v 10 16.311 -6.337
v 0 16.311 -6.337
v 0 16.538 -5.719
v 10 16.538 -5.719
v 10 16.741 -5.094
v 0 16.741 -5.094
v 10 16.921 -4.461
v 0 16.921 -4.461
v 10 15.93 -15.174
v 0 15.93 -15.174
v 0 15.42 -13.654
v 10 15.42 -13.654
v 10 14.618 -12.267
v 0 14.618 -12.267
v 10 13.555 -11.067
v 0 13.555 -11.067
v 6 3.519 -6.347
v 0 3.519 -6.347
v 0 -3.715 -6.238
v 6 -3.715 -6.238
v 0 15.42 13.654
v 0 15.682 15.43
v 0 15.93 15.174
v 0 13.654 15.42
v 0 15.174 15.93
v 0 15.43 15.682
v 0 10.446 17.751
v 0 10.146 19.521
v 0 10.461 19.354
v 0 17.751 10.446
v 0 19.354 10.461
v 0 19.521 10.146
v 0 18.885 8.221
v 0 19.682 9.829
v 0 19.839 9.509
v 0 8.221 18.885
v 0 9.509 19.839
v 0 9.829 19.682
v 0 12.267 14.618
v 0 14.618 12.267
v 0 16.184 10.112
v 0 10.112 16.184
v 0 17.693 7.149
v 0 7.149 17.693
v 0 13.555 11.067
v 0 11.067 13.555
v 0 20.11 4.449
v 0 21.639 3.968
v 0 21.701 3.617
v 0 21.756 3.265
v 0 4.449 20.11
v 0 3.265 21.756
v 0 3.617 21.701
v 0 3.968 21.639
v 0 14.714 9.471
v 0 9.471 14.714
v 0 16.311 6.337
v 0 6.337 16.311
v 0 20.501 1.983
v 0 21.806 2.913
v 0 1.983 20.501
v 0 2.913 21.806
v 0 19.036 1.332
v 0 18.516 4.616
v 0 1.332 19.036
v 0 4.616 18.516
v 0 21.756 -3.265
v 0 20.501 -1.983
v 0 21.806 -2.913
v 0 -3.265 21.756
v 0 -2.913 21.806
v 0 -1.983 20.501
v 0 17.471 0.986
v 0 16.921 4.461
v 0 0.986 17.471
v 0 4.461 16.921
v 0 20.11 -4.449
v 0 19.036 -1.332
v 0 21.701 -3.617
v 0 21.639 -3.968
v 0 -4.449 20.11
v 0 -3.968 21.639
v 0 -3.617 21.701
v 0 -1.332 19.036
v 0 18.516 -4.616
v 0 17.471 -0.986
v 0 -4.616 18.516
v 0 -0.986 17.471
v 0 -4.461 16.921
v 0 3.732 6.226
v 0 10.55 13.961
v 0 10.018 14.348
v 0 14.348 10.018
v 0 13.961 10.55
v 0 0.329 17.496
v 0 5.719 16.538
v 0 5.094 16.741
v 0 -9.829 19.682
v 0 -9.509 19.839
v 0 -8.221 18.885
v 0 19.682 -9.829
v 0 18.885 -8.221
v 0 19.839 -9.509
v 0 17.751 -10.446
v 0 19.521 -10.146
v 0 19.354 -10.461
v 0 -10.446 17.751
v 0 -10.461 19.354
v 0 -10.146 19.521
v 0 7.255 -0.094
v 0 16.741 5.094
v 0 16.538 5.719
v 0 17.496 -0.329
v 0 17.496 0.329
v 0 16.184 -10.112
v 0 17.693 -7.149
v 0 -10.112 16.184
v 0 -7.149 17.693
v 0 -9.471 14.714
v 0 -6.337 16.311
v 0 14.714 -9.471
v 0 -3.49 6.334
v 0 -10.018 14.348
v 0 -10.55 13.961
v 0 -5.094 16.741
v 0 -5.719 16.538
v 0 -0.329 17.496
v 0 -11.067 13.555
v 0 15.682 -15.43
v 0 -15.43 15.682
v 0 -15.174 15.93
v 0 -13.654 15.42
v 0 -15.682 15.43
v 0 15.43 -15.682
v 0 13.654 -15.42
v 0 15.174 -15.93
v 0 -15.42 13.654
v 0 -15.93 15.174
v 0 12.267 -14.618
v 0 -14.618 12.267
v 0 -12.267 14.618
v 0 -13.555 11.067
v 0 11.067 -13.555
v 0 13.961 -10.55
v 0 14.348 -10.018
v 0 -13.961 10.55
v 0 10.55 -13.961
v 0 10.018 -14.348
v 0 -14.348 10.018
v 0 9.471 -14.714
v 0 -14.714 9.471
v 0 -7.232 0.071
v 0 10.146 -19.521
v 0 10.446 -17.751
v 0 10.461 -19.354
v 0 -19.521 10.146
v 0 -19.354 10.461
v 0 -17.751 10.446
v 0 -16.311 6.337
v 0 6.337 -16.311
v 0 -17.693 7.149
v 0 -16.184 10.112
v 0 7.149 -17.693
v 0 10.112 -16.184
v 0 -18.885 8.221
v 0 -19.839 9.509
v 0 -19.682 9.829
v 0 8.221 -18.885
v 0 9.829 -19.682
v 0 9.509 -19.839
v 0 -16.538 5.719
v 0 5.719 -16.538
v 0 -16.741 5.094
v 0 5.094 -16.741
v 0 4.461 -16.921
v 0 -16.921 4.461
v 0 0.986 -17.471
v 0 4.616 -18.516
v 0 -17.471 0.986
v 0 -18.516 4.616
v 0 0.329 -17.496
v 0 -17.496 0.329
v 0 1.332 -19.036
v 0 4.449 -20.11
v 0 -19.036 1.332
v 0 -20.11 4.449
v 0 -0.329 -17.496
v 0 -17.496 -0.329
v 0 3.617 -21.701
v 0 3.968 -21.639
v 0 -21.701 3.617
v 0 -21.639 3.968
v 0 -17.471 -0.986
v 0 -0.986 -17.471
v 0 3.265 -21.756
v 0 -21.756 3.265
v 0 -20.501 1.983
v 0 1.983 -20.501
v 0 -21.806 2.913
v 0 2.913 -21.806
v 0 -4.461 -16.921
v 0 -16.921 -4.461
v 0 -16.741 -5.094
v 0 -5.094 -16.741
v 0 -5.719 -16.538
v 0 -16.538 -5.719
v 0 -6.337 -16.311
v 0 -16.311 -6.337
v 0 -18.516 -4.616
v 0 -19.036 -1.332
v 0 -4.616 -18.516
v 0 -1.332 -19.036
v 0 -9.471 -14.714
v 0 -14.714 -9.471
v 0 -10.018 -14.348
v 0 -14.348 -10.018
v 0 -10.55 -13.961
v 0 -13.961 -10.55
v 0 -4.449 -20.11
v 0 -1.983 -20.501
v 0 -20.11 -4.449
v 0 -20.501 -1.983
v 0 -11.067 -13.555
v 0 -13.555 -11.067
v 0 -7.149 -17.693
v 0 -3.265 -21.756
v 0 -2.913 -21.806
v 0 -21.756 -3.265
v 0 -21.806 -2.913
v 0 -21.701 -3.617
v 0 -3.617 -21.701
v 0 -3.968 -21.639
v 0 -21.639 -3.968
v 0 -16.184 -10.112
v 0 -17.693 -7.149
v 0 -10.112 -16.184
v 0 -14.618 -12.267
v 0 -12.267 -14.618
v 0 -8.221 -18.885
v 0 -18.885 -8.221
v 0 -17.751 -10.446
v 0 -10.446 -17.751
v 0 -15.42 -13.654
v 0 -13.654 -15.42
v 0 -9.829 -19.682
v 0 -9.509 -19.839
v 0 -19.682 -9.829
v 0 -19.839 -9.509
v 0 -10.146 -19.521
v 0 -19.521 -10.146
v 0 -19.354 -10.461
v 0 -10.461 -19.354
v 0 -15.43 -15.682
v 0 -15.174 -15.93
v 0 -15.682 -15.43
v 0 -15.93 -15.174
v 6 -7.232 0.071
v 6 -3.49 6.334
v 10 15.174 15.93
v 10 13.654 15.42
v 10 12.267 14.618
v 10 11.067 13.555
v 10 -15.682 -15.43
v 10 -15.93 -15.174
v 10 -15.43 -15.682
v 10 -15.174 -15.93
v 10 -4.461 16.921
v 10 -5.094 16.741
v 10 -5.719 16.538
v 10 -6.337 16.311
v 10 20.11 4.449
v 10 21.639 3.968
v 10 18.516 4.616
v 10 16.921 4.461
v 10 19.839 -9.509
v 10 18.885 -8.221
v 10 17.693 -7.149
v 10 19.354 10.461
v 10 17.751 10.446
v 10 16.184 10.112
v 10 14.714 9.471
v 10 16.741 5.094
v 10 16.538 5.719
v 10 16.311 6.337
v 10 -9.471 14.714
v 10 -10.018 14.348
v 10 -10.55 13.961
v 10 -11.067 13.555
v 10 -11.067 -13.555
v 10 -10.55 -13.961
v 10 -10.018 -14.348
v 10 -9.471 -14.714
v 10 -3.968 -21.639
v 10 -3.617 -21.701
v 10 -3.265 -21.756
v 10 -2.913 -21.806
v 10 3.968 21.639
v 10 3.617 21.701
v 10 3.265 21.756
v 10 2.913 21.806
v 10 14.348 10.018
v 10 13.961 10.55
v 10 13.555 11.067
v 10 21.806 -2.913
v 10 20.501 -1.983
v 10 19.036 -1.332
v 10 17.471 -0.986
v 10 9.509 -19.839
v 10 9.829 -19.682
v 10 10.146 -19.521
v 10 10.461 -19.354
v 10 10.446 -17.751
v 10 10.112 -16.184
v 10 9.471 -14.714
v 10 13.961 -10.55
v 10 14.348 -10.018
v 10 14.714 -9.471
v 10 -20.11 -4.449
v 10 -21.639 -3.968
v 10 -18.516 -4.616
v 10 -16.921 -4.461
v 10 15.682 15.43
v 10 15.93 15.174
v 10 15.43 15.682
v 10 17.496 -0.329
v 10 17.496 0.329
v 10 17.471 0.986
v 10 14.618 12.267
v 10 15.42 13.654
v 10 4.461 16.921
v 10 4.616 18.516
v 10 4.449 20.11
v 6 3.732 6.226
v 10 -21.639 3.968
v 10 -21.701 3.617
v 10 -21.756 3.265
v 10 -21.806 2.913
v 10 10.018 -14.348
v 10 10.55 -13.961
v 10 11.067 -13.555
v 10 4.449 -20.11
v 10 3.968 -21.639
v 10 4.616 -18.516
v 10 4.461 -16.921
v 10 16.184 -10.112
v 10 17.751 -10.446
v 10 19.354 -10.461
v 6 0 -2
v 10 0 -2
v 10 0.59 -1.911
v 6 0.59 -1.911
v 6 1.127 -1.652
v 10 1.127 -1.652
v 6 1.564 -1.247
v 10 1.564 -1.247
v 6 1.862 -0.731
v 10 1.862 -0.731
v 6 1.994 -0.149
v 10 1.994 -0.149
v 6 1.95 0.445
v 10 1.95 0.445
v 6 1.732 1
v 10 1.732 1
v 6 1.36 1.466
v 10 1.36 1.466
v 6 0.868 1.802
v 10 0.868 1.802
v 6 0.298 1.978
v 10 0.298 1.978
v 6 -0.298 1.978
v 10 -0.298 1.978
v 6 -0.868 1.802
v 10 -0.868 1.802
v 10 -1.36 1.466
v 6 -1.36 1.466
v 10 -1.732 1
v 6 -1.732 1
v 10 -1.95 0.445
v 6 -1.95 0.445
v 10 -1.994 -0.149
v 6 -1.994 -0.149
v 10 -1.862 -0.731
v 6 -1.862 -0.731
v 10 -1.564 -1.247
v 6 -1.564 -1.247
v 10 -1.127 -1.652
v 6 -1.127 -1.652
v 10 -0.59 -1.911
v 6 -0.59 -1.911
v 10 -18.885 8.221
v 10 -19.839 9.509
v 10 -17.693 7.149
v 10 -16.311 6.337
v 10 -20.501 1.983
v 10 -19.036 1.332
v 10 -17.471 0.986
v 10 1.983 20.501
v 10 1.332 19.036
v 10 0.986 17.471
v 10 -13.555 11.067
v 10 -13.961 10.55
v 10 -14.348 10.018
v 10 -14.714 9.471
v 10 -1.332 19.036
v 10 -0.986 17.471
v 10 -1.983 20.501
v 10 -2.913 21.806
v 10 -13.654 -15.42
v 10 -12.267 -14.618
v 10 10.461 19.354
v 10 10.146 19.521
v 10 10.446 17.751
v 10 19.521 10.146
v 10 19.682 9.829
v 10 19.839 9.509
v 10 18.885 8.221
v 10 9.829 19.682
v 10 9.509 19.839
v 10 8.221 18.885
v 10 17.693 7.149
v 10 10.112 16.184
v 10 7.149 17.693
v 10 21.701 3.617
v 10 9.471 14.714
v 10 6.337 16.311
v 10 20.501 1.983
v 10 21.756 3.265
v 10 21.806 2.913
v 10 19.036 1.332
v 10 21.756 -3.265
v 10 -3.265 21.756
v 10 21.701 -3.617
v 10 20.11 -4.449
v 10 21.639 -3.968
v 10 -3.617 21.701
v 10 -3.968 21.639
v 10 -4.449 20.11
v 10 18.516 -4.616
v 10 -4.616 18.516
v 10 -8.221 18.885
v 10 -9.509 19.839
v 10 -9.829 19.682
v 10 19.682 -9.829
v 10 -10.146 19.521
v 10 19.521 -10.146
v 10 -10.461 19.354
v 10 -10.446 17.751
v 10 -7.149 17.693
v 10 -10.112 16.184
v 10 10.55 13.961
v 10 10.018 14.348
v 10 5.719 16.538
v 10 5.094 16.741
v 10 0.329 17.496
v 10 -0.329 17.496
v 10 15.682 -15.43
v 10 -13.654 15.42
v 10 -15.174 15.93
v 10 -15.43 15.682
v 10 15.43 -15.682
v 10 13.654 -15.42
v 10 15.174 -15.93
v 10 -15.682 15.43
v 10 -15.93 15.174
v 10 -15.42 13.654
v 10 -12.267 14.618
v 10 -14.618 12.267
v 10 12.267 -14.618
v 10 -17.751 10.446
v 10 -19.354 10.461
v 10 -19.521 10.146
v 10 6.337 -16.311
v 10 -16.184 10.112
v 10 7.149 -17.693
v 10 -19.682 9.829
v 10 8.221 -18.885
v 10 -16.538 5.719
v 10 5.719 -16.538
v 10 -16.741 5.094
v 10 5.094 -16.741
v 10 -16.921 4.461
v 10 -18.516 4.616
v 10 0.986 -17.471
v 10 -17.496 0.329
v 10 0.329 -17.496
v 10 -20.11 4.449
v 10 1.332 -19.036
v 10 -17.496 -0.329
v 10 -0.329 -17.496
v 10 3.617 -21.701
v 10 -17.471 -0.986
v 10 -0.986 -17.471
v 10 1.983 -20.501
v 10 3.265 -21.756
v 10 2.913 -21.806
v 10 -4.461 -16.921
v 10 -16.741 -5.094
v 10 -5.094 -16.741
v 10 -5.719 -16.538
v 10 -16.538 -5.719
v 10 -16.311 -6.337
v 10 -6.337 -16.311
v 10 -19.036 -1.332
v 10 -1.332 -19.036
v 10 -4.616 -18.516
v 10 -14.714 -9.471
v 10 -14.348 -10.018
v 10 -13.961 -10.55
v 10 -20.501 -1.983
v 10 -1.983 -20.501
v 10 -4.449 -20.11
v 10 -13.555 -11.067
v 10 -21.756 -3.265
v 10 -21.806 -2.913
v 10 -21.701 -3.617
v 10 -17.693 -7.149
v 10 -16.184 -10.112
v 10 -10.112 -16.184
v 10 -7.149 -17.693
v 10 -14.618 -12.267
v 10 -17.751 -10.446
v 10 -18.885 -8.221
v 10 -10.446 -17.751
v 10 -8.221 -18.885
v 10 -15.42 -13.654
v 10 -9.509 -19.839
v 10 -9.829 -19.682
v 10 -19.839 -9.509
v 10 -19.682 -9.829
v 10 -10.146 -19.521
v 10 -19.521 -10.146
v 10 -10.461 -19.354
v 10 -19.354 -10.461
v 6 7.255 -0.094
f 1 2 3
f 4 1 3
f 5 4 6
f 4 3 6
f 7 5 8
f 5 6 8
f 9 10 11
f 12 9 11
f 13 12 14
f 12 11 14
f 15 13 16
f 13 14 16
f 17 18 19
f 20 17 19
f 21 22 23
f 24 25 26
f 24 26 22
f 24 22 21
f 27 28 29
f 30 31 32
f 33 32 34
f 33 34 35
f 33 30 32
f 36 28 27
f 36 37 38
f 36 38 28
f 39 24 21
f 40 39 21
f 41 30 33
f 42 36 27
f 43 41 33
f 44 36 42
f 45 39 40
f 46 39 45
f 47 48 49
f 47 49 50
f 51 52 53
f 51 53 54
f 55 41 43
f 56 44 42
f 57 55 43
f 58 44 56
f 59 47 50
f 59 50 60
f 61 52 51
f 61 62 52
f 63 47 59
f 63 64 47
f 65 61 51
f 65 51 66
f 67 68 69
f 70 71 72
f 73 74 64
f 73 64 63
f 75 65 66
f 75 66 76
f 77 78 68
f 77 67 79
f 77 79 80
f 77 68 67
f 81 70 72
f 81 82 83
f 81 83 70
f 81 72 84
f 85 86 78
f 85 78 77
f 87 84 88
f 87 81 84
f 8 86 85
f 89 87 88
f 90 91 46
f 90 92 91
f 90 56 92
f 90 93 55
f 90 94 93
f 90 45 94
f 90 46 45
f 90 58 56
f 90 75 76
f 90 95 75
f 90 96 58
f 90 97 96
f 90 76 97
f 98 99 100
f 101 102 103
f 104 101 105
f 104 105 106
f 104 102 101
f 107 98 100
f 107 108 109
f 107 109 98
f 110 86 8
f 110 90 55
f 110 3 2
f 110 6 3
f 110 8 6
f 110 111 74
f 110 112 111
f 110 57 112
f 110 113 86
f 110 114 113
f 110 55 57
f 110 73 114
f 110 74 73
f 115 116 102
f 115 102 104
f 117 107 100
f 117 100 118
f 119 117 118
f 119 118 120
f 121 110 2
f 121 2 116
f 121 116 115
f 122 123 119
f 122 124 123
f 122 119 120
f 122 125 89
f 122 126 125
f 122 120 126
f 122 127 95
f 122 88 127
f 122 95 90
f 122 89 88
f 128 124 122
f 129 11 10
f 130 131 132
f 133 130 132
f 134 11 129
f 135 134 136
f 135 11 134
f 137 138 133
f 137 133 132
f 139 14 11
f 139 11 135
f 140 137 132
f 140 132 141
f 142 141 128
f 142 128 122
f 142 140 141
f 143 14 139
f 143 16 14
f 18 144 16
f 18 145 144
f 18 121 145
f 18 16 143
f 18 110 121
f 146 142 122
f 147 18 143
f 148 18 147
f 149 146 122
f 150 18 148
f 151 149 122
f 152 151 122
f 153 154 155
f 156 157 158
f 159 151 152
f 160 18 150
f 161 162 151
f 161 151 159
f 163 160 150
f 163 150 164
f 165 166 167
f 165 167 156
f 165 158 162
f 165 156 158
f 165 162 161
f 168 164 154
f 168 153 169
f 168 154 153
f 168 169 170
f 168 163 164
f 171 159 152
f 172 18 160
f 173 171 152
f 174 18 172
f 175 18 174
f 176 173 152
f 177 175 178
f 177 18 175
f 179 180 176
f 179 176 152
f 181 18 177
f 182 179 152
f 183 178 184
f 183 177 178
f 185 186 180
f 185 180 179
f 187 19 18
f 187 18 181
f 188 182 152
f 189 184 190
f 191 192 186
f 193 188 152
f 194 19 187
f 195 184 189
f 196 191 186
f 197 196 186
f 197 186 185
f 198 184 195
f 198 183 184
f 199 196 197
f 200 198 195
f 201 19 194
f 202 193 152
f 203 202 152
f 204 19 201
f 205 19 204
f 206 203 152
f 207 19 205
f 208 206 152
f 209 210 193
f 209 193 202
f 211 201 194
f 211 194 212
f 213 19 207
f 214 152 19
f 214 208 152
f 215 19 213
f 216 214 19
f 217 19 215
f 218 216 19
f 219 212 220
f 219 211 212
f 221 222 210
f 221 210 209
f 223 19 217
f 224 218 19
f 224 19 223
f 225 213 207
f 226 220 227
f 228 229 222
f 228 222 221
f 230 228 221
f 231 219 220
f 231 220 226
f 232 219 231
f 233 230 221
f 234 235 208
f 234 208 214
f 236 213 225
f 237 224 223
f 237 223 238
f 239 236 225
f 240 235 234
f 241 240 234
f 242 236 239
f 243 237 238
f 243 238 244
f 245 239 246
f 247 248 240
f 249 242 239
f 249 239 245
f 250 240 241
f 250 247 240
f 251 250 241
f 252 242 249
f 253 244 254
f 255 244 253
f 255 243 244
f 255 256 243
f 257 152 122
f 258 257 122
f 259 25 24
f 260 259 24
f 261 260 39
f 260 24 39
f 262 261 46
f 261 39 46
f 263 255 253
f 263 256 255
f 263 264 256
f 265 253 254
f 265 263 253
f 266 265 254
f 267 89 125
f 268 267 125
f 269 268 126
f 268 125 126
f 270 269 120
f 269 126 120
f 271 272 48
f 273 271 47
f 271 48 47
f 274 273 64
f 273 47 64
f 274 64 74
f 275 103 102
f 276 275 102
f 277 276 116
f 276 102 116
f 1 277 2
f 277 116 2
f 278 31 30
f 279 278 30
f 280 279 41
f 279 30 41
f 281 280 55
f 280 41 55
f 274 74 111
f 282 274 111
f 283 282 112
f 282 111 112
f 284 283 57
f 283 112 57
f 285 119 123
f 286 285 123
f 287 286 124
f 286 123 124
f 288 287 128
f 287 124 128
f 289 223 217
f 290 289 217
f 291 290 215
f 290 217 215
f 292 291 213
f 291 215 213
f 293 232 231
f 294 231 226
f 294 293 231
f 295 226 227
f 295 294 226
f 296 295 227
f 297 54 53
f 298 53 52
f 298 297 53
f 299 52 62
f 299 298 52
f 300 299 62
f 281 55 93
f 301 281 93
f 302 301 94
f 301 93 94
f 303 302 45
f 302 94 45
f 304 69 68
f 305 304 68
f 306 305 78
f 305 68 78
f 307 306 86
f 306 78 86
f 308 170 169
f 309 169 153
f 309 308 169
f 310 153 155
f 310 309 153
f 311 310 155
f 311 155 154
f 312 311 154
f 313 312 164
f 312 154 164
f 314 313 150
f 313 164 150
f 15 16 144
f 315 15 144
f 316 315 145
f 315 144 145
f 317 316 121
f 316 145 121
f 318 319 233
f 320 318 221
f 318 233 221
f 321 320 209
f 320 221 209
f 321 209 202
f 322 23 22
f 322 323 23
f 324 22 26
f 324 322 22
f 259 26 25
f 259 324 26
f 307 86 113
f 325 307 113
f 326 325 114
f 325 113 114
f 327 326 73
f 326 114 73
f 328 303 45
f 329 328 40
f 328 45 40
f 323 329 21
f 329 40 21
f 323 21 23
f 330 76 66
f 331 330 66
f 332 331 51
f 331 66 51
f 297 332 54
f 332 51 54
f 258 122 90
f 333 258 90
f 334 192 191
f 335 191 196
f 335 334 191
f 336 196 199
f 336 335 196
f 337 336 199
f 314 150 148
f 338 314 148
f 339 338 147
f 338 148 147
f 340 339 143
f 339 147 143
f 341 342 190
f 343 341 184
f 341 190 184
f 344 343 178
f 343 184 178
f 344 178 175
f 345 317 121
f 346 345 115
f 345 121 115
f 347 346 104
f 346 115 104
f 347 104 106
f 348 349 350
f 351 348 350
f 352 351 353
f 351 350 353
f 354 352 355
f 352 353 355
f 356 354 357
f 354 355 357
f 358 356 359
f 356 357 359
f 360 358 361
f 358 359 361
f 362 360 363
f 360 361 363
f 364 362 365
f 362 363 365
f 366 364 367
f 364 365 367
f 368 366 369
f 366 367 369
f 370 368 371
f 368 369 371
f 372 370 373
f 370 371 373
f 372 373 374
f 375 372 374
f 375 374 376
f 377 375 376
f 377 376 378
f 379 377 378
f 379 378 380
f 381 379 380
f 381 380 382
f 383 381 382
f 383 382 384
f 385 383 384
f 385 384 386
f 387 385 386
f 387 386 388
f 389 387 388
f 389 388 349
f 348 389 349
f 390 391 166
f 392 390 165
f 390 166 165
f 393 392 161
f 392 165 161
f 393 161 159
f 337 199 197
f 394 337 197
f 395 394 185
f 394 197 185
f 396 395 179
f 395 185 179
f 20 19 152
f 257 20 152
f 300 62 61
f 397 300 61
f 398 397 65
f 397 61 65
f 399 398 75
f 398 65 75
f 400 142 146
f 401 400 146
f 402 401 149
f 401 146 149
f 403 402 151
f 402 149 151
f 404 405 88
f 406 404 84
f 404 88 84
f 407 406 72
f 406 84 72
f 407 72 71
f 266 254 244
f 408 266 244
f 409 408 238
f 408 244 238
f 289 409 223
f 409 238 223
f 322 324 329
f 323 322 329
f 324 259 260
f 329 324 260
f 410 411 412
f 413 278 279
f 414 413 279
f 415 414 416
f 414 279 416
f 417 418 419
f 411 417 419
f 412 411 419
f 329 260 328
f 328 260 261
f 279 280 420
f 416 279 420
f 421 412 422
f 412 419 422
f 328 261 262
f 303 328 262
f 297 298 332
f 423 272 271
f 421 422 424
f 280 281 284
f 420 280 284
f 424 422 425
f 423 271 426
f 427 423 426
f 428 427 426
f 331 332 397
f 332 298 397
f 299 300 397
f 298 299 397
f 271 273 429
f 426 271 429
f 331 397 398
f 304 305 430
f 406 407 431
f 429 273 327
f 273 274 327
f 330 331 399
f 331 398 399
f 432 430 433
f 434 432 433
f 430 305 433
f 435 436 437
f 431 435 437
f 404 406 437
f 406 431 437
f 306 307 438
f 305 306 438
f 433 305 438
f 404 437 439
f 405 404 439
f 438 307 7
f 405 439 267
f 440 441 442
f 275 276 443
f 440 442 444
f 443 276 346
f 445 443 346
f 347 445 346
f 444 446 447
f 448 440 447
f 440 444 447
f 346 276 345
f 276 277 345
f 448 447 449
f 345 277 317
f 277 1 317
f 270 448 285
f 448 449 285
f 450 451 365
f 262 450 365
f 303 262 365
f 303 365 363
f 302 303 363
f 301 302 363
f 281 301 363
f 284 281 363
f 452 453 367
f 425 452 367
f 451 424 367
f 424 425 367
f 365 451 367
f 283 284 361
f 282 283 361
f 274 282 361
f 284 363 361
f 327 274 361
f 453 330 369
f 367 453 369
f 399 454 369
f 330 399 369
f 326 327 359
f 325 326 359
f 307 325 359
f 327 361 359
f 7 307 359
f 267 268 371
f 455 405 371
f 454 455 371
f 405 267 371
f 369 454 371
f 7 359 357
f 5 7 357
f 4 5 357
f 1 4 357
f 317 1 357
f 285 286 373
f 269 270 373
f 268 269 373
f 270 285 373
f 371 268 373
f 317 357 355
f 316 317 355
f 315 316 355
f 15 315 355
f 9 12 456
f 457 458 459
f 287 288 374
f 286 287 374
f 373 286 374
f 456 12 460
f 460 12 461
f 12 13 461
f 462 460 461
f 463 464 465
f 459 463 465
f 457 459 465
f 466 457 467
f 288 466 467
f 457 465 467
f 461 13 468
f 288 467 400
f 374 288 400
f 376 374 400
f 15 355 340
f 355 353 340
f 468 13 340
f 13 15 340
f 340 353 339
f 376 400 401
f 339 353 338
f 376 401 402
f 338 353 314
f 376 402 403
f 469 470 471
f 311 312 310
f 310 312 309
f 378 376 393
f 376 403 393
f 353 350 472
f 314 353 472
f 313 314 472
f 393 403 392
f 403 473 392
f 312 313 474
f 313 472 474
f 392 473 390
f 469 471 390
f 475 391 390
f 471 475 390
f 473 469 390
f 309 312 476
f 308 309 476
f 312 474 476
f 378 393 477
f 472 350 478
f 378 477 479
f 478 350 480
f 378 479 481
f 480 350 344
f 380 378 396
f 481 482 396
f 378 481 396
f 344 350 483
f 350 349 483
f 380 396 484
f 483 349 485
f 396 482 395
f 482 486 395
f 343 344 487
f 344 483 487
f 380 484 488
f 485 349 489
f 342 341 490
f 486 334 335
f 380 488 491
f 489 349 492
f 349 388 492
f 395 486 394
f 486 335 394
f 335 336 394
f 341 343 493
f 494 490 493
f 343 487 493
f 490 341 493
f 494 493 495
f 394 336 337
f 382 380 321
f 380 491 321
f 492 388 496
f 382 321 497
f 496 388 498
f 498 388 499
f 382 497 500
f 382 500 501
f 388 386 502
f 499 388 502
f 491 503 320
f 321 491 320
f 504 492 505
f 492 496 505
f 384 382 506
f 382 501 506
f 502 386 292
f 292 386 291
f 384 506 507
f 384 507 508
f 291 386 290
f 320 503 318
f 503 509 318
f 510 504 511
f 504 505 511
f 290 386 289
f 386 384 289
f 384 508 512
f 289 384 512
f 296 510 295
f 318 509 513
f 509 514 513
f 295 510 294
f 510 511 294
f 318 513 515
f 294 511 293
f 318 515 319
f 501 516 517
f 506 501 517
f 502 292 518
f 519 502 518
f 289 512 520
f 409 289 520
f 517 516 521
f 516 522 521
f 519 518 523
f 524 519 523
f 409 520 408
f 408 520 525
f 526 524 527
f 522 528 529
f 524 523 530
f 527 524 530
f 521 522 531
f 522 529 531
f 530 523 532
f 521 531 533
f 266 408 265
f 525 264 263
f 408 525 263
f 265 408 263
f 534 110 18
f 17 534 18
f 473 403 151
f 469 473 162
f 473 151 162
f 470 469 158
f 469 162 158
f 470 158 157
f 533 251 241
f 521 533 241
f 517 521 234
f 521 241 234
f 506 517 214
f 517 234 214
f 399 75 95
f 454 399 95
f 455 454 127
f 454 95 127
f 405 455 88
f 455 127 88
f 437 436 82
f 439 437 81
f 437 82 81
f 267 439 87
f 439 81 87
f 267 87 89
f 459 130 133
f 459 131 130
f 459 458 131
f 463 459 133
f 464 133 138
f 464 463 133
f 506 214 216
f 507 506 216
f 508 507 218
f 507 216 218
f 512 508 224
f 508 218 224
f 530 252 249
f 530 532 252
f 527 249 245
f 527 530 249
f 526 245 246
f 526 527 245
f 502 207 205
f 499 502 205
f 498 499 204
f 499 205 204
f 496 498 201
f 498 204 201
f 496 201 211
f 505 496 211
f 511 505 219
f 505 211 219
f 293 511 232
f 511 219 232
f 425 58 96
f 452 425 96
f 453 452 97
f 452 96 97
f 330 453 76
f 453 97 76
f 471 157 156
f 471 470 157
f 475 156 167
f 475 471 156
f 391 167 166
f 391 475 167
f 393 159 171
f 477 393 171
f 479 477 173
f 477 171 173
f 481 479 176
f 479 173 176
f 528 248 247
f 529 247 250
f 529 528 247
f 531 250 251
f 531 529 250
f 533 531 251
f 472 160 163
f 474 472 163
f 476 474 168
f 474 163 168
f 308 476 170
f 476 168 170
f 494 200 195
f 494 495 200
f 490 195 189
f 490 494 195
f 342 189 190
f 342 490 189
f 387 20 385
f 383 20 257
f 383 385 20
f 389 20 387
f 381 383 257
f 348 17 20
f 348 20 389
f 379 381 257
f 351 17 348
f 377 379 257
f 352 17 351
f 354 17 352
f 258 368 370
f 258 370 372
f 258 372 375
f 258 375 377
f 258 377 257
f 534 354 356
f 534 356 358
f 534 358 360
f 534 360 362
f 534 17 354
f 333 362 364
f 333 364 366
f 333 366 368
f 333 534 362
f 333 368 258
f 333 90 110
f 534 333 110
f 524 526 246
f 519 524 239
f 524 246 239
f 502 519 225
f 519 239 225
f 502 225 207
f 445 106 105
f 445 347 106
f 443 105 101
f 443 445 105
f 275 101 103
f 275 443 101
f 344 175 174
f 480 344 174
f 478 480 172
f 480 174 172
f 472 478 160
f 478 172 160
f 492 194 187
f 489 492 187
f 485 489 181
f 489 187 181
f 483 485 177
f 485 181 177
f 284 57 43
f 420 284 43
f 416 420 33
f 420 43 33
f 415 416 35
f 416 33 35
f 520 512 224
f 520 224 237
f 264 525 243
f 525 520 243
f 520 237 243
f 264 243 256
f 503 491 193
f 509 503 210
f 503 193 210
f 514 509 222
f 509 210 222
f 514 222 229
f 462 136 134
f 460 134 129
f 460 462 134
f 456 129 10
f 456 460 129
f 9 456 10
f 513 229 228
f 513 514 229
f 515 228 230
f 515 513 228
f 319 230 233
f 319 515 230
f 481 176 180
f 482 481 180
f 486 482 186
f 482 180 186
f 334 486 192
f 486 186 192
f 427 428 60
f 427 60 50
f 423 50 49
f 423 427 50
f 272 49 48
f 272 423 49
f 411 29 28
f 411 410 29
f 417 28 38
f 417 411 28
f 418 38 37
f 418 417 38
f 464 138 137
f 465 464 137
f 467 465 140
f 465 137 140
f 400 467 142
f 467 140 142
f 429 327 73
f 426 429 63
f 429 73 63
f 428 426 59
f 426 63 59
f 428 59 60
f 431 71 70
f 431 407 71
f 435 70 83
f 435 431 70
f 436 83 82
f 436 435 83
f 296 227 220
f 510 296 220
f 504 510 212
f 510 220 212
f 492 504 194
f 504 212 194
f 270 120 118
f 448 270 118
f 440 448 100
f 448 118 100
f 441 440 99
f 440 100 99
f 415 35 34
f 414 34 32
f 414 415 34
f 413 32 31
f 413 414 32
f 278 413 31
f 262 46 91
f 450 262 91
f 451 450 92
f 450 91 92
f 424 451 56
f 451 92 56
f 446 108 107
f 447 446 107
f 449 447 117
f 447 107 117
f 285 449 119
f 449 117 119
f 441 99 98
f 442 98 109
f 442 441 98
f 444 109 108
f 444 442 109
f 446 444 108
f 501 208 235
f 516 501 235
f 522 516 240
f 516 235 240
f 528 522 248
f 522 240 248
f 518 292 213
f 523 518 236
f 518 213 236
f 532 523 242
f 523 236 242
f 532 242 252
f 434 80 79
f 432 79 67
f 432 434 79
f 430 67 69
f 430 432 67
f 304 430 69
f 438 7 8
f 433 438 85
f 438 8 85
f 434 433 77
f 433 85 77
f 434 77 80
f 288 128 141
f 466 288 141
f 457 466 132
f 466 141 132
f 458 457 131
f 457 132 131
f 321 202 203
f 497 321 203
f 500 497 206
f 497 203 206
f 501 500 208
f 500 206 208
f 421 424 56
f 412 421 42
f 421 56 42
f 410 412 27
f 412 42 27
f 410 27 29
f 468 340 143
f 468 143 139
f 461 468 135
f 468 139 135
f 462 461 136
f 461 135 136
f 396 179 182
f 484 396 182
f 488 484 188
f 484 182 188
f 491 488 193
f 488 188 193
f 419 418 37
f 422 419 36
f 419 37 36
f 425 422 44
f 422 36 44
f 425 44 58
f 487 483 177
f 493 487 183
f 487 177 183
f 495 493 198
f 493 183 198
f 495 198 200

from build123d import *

# Parameters (mm, degrees)
BASPROSKE_W        = 10
BASPROSKE_H        = 22
TOOTHCUT_DEPTH     = 33.680269277
TEETHCUTS_COUNT    = 20
TEETHCUTS_ANGLE    = 342
BORSKE_R           = 0.4
BORE_DEPTH         = 50.0000508
CUT_EXTRUDE1_DEPTH = 6
SKETCH2_R          = 2
CUT_EXTRUDE2_DEPTH = 6
CUT_EXTRUDE3_DEPTH = 6


with BuildPart() as part:
    # BasProSke → Base-Revolve (revolve)
    with BuildSketch(Plane(origin=(0, 0, 0), x_dir=(1, 0, 0), z_dir=(0, 1, 0)), mode=Mode.PRIVATE) as base_revolve_sk:
        with Locations((5, 11)):
            Rectangle(BASPROSKE_W, BASPROSKE_H)
    revolve(base_revolve_sk.sketch.rotate(Axis((-10, 0, 0), (1, 0, 0)), 180), axis=Axis((-10, 0, 0), (1, 0, 0)))

    # TooCutSke → ToothCut (cut, through all)
    with BuildSketch(Plane(origin=(0, 0, 0), x_dir=(0, 0, -1), z_dir=(1, 0, 0))):
        with BuildLine():
            ThreePointArc((0.986171591, 17.471189616), (0, 17.499), (-0.986171591, 17.471189616))
            ThreePointArc((-0.986171591, 17.471189616), (-1.626916196, 19.798789858), (-2.932850173, 21.829260982))
            ThreePointArc((-2.932850173, 21.829260982), (0, 22.0254), (2.932850173, 21.829260982))
            ThreePointArc((2.932850173, 21.829260982), (1.626916196, 19.798789858), (0.986171591, 17.471189616))
        make_face()
    toothcut = extrude(amount=TOOTHCUT_DEPTH, mode=Mode.SUBTRACT)

    # TeethCuts: ToothCut ×20 about axis
    teethcuts_axis = Axis((-10, 0, 0), (1, 0, 0))
    for i in range(1, TEETHCUTS_COUNT):
        add(toothcut.rotate(teethcuts_axis, i * TEETHCUTS_ANGLE / (TEETHCUTS_COUNT - 1)), mode=Mode.SUBTRACT)

    # BorSke → Bore (cut, symmetric)
    with BuildSketch(Plane(origin=(0, 0, 0), x_dir=(0, 0, -1), z_dir=(1, 0, 0))):
        with Locations(Location((0, 0, 0), (0, 0, 180))):
            Circle(BORSKE_R)
    extrude(amount=BORE_DEPTH, both=True, mode=Mode.SUBTRACT)

    # Sketch1 → Cut-Extrude1 (cut)
    with BuildSketch(Plane.ZY):
        Polygon((-5.947236483, -3.553917279), (0.104168329, -6.927416915), (6.05140712, -3.373496436), (5.947241098, 3.553923678), (-0.104163715, 6.927423314), (-6.051402506, 3.373502835), align=None)
    extrude(amount=-CUT_EXTRUDE1_DEPTH, mode=Mode.SUBTRACT)

    # Sketch2 → Cut-Extrude2 (cut)
    with BuildSketch(Plane(origin=(10, 0, 0), x_dir=(0, 0, -1), z_dir=(1, 0, 0))):
        with Locations((-2.307e-06, 3.199e-06)):
            Circle(SKETCH2_R)
    extrude(amount=-CUT_EXTRUDE2_DEPTH, mode=Mode.SUBTRACT)

    # Sketch4 → Cut-Extrude3 (cut)
    with BuildSketch(Plane.ZY):
        Polygon((-6.346541022, 3.518535779), (-6.237773669, -3.714889608), (0.071344514, -7.232057695), (6.334133484, -3.489572357), (6.225545747, 3.731907869), (-0.094007056, 7.254892984), align=None)
    extrude(amount=-CUT_EXTRUDE3_DEPTH, mode=Mode.SUBTRACT)


solid = part.part
